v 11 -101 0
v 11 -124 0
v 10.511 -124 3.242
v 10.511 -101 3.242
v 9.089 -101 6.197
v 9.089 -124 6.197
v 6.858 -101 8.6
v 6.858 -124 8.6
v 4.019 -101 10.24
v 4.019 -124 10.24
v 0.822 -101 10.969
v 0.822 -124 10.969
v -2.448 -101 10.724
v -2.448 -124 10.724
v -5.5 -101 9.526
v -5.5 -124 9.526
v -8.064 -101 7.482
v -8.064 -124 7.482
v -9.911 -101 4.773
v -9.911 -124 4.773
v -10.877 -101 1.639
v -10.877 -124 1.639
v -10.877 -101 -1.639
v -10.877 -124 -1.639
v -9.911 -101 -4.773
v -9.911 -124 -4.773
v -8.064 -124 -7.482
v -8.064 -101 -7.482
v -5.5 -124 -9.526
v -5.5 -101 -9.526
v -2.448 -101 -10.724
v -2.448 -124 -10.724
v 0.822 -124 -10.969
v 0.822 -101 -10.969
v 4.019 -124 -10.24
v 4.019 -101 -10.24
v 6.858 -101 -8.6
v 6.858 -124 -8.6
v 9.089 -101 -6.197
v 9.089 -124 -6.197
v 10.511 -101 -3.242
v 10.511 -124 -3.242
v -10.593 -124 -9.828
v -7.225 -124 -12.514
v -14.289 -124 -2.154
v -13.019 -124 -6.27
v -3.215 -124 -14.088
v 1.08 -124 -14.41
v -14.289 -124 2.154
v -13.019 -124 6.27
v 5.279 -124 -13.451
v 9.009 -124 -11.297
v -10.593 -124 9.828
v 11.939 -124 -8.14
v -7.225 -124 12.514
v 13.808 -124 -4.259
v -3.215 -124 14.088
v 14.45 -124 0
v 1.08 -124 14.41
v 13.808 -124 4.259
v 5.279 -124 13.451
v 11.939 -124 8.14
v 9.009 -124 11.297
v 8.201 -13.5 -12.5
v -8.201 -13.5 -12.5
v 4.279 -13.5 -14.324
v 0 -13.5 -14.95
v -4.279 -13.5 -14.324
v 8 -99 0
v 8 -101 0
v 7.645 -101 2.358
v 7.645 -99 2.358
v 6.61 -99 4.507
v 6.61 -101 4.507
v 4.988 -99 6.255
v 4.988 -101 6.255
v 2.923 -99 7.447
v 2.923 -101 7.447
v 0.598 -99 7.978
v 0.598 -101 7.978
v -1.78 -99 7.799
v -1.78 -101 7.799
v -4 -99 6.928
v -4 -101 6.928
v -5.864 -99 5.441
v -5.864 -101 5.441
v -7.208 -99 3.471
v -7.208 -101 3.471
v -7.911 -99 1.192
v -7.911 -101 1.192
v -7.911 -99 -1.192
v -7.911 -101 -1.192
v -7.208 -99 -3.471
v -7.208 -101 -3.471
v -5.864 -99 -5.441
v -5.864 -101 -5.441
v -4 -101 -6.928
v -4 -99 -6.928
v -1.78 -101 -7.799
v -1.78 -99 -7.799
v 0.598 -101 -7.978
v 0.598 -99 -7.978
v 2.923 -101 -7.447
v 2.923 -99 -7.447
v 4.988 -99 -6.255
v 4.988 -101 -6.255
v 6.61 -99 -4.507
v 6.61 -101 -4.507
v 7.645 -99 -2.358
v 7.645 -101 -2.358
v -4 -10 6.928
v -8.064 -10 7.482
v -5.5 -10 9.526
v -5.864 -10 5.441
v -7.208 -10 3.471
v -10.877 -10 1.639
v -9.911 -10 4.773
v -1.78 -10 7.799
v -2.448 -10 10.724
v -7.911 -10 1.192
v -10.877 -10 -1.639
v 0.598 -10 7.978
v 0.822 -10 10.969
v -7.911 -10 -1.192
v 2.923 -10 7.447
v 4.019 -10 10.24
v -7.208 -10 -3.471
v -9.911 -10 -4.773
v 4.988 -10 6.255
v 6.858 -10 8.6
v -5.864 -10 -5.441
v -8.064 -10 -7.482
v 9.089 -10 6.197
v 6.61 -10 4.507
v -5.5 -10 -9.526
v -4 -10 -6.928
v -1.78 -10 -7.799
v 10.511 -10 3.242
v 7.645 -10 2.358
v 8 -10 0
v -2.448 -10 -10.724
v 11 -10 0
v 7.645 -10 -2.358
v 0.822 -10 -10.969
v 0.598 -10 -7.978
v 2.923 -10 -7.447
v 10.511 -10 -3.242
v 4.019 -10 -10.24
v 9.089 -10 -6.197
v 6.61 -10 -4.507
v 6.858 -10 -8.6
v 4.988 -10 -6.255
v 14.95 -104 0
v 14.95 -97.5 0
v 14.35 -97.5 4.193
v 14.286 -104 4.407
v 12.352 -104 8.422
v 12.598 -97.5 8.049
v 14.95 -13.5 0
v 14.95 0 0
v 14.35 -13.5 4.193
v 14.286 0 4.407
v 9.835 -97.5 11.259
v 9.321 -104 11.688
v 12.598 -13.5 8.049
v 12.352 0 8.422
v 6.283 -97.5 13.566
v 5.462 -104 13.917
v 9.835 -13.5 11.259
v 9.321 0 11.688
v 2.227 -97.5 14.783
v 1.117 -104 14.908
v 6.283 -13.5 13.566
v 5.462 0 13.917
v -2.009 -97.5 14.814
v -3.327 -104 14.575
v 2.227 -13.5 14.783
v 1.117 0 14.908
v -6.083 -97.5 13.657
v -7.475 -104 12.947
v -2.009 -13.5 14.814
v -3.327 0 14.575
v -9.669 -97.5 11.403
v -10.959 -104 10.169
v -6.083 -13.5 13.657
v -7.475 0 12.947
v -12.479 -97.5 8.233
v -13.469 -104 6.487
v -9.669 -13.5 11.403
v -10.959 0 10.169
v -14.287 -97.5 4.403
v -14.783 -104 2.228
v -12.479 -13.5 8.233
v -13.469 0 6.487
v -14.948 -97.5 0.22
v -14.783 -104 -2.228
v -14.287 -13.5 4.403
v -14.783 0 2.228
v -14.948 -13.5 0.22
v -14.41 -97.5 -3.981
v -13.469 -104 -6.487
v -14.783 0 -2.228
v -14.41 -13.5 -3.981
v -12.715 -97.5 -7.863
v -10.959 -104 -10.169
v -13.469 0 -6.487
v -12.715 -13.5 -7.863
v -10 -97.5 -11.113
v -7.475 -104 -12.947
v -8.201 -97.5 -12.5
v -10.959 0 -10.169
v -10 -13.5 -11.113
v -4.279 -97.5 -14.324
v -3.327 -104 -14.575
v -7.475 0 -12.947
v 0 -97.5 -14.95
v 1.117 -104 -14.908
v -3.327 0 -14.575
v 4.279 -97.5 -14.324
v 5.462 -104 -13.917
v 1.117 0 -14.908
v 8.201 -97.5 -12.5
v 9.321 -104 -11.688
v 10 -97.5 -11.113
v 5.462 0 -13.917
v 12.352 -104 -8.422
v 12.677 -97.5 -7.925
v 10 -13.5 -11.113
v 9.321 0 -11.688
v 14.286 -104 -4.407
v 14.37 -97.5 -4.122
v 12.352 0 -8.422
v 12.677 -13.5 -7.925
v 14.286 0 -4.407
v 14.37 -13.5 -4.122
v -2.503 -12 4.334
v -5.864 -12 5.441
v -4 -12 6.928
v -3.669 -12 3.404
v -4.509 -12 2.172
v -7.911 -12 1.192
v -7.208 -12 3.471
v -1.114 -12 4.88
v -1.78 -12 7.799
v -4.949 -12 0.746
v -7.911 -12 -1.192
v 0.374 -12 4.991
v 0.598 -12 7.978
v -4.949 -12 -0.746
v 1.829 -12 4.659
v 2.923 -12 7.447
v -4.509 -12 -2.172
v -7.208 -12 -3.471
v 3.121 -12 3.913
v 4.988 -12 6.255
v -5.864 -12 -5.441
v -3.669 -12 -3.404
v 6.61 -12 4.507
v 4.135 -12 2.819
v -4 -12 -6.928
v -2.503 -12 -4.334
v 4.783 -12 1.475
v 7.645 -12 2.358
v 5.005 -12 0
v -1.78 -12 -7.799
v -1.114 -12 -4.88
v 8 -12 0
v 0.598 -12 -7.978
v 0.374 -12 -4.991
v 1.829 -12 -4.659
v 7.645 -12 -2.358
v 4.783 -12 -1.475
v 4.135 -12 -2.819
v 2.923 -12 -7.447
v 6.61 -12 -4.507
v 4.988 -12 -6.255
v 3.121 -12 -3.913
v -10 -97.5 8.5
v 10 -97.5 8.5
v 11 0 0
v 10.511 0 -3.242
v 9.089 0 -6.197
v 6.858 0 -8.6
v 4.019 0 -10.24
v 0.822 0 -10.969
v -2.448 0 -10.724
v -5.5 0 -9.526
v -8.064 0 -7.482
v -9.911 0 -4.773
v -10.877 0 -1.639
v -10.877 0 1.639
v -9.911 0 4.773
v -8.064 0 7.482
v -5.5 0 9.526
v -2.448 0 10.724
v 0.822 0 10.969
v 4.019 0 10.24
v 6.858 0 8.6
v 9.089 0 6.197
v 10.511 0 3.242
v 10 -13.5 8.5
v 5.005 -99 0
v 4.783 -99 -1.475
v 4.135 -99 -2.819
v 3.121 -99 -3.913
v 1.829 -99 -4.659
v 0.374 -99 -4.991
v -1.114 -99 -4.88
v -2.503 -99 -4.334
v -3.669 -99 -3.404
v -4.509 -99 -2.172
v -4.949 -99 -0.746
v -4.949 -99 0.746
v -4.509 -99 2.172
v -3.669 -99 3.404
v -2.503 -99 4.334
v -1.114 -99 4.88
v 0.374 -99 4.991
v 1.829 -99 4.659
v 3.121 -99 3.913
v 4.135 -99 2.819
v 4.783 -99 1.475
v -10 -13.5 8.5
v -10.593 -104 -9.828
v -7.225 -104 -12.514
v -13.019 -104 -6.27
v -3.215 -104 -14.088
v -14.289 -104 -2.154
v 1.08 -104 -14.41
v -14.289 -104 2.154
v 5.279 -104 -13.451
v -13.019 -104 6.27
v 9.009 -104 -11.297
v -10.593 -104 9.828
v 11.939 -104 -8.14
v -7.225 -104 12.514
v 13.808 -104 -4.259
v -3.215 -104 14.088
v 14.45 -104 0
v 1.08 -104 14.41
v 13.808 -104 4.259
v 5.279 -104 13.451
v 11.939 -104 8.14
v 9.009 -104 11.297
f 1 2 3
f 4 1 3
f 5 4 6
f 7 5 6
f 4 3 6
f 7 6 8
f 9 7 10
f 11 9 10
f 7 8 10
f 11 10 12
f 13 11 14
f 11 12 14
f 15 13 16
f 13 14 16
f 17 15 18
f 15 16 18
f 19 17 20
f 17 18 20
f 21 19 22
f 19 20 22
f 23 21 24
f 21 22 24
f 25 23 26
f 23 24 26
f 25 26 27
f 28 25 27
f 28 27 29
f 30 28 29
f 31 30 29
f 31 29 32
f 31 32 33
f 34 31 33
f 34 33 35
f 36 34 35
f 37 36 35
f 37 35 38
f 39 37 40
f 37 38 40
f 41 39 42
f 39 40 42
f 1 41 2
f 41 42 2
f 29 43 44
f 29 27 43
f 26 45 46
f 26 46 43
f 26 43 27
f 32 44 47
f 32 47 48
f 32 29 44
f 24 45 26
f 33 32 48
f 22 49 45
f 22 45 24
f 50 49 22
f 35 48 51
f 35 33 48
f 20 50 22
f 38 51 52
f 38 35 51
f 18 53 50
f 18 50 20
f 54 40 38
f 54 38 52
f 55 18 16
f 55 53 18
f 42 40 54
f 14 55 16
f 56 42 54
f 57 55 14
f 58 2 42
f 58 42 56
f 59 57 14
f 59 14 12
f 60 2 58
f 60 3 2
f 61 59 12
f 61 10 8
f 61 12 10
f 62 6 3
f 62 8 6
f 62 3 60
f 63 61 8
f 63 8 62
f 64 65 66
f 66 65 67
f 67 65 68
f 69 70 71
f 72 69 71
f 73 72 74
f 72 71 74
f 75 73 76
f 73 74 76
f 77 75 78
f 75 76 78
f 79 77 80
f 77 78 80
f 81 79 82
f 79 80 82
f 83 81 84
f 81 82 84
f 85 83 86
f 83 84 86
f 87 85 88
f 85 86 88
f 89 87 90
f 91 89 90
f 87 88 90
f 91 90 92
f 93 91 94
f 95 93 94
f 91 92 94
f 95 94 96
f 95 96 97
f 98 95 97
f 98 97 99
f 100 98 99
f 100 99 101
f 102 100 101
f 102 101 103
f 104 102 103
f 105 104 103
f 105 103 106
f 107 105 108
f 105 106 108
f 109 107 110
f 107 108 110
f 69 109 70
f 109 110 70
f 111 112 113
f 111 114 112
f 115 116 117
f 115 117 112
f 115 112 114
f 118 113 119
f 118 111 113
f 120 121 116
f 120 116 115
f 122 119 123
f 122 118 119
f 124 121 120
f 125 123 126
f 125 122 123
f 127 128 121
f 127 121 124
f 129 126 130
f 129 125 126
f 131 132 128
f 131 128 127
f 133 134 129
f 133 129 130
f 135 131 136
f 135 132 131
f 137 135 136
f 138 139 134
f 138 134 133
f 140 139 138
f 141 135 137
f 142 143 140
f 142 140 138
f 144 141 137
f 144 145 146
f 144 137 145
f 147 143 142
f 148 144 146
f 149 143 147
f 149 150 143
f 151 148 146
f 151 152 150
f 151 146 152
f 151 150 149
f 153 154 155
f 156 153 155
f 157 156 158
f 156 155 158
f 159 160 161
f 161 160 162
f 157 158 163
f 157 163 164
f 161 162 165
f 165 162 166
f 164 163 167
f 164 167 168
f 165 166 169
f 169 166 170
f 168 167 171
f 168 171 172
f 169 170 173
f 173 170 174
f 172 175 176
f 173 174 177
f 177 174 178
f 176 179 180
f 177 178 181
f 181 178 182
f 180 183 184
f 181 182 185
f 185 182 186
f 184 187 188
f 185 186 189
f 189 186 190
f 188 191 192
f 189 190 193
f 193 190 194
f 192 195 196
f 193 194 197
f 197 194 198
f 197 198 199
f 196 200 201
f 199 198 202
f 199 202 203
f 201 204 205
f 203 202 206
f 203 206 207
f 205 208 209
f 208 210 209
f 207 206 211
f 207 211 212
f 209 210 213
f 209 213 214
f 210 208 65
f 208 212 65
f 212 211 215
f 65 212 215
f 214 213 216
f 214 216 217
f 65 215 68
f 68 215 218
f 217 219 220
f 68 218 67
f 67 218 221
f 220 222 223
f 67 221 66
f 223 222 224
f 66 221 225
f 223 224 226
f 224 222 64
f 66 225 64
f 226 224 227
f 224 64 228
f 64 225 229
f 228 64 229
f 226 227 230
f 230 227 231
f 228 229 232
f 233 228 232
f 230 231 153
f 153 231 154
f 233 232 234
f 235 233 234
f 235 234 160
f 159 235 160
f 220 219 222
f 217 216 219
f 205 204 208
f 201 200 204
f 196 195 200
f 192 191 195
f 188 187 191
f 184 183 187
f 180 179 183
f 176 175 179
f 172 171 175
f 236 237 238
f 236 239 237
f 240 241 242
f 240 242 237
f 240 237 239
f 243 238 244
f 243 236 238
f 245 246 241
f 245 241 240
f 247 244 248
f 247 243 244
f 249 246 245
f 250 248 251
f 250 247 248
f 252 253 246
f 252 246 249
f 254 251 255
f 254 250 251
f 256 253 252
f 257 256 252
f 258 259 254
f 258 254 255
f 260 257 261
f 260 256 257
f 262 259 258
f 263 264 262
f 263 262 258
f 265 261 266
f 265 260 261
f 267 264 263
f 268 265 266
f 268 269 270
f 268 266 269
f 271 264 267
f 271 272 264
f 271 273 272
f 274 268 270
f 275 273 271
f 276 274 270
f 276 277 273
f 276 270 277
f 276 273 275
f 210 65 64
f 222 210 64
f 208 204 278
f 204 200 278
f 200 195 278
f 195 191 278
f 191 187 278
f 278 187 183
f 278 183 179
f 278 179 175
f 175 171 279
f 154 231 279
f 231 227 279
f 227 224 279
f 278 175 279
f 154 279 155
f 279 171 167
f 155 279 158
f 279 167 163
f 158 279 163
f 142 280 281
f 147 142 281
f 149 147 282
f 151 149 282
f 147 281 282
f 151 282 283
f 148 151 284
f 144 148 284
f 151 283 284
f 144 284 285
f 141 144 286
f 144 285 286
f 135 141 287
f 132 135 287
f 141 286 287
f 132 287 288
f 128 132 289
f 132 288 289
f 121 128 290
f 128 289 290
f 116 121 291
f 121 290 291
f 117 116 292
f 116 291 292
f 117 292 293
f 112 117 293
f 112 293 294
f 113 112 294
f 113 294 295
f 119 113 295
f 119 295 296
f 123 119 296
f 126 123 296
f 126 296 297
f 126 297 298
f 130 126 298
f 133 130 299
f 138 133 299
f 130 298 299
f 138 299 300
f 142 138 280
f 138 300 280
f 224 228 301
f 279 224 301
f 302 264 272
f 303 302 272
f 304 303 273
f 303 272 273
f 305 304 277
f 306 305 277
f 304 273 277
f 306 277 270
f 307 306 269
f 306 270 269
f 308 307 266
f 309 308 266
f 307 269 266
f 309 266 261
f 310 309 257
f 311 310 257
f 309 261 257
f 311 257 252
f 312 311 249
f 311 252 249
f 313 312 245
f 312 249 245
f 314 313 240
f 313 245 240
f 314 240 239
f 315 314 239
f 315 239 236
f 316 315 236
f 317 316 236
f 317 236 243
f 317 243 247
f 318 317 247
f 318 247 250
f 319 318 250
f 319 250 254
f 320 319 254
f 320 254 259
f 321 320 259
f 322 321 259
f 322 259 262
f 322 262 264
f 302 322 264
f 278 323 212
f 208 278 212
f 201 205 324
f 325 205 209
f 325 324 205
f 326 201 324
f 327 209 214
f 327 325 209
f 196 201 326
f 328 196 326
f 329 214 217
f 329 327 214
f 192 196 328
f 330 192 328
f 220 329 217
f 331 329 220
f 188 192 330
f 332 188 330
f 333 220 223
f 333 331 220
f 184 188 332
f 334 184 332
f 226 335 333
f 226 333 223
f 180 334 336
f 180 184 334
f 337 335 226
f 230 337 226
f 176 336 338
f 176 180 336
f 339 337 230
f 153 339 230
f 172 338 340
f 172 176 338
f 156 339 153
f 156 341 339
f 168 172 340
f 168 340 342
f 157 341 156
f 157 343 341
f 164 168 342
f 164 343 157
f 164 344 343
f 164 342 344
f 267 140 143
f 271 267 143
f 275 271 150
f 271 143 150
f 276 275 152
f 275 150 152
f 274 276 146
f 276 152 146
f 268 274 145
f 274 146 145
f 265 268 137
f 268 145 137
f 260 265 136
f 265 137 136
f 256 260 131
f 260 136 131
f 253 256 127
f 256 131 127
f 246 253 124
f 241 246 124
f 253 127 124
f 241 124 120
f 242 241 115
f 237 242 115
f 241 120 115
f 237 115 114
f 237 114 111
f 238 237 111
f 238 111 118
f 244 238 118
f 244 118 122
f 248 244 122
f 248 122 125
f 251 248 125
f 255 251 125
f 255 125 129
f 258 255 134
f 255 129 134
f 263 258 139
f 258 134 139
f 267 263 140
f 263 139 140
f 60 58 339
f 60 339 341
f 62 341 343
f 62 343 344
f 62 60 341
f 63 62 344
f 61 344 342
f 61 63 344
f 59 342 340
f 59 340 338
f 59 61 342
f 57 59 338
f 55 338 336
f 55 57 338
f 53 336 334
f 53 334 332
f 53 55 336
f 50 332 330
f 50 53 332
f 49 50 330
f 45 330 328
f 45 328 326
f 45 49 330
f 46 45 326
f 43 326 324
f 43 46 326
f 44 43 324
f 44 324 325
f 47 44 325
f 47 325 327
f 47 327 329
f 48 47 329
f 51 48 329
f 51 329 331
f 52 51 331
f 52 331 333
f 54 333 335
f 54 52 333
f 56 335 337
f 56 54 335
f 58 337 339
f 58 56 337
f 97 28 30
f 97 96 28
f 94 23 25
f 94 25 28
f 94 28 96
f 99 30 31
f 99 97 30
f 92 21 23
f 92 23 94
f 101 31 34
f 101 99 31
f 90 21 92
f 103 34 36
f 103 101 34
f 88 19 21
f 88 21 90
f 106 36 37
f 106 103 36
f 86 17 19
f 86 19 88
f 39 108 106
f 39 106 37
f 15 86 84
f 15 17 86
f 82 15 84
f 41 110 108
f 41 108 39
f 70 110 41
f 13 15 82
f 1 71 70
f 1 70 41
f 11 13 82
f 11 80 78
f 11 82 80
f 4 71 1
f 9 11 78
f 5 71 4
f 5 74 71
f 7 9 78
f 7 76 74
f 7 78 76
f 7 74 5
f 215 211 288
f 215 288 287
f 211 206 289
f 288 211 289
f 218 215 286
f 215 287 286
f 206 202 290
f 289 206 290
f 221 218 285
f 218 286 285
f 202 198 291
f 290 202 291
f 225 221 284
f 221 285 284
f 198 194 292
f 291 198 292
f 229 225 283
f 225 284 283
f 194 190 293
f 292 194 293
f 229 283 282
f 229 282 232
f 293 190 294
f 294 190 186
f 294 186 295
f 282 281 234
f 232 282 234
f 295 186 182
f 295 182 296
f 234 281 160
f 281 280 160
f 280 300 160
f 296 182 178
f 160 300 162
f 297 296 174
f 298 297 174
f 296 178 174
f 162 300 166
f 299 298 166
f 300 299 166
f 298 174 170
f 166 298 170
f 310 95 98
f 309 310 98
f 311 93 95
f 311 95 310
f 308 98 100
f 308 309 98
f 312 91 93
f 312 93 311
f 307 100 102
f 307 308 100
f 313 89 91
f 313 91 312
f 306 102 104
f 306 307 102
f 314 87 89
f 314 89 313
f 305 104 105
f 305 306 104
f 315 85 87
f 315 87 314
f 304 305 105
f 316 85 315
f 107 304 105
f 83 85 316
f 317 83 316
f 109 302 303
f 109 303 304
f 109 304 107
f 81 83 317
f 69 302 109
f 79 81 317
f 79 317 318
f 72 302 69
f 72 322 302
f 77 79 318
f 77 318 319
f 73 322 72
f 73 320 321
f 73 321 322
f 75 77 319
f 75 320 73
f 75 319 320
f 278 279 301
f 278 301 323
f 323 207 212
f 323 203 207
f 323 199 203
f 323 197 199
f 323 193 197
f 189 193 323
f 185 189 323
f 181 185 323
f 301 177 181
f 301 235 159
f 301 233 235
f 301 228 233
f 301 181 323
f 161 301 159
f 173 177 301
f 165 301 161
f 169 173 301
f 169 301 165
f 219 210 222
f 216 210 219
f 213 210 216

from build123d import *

# Parameters (mm, degrees)
SKETCH_R        = 14.95
PAD001_DEPTH    = 124
SKETCH001_R     = 11
POCKET_DEPTH    = 10
SKETCH021_R     = 8
POCKET007_DEPTH = 2
SKETCH002_R     = 5.005
POCKET001_DEPTH = 114.001
SKETCH003_R     = 11
POCKET002_DEPTH = 23
SKETCH022_R     = 8
POCKET008_DEPTH = 2
SKETCH004_W     = 30.9
SKETCH004_H     = 30.9
POCKET003_DEPTH = 84
SKETCH015_R     = 15.45
SKETCH015_R_2   = 14.45
POCKET005_DEPTH = 20


with BuildPart() as part:
    # Sketch → Pad001 (new body)
    with BuildSketch(Plane.XZ):
        Circle(SKETCH_R)
    extrude(amount=PAD001_DEPTH)

    # Sketch001 (on Face2 of Pad001) → Pocket (cut)
    with BuildSketch(Plane(origin=(0, 0, 0), x_dir=(1, 0, 0), z_dir=(0, 1, 0))):
        Circle(SKETCH001_R)
    extrude(amount=-POCKET_DEPTH, mode=Mode.SUBTRACT)

    # Sketch021 (on Face5 of Pocket) → Pocket007 (cut)
    with BuildSketch(Plane(origin=(0, -10, 0), x_dir=(1, 0, 0), z_dir=(0, 1, 0))):
        Circle(SKETCH021_R)
    extrude(amount=-POCKET007_DEPTH, mode=Mode.SUBTRACT)

    # Sketch002 (on Face5 of Pocket) → Pocket001 (cut, through all)
    with BuildSketch(Plane(origin=(0, -10, 0), x_dir=(1, 0, 0), z_dir=(0, 1, 0))):
        Circle(SKETCH002_R)
    extrude(amount=-POCKET001_DEPTH, mode=Mode.SUBTRACT)

    # Sketch003 (on Face3 of Pocket001) → Pocket002 (cut)
    with BuildSketch(Plane.XZ.offset(124)):
        Circle(SKETCH003_R)
    extrude(amount=-POCKET002_DEPTH, mode=Mode.SUBTRACT)

    # Sketch022 (on Face7 of Pocket002) → Pocket008 (cut)
    with BuildSketch(Plane.XZ.offset(101)):
        Circle(SKETCH022_R)
    extrude(amount=-POCKET008_DEPTH, mode=Mode.SUBTRACT)

    # Sketch004 → Pocket003 (cut)
    with BuildSketch(Plane.XZ.offset(13.5)):
        Rectangle(SKETCH004_W, SKETCH004_H)
        Polygon((-9.292893, -12.5), (9.292893, -12.5), (10, -11.792893), (10, 8.5), (-10, 8.5), (-10, -11.792893), align=None, mode=Mode.SUBTRACT)
    extrude(amount=POCKET003_DEPTH, mode=Mode.SUBTRACT)

    # Sketch015 (on Face6 of Pocket003) → Pocket005 (cut)
    with BuildSketch(Plane.XZ.offset(124)):
        Circle(SKETCH015_R)
        Circle(SKETCH015_R_2, mode=Mode.SUBTRACT)
    extrude(amount=-POCKET005_DEPTH, mode=Mode.SUBTRACT)


solid = part.part
